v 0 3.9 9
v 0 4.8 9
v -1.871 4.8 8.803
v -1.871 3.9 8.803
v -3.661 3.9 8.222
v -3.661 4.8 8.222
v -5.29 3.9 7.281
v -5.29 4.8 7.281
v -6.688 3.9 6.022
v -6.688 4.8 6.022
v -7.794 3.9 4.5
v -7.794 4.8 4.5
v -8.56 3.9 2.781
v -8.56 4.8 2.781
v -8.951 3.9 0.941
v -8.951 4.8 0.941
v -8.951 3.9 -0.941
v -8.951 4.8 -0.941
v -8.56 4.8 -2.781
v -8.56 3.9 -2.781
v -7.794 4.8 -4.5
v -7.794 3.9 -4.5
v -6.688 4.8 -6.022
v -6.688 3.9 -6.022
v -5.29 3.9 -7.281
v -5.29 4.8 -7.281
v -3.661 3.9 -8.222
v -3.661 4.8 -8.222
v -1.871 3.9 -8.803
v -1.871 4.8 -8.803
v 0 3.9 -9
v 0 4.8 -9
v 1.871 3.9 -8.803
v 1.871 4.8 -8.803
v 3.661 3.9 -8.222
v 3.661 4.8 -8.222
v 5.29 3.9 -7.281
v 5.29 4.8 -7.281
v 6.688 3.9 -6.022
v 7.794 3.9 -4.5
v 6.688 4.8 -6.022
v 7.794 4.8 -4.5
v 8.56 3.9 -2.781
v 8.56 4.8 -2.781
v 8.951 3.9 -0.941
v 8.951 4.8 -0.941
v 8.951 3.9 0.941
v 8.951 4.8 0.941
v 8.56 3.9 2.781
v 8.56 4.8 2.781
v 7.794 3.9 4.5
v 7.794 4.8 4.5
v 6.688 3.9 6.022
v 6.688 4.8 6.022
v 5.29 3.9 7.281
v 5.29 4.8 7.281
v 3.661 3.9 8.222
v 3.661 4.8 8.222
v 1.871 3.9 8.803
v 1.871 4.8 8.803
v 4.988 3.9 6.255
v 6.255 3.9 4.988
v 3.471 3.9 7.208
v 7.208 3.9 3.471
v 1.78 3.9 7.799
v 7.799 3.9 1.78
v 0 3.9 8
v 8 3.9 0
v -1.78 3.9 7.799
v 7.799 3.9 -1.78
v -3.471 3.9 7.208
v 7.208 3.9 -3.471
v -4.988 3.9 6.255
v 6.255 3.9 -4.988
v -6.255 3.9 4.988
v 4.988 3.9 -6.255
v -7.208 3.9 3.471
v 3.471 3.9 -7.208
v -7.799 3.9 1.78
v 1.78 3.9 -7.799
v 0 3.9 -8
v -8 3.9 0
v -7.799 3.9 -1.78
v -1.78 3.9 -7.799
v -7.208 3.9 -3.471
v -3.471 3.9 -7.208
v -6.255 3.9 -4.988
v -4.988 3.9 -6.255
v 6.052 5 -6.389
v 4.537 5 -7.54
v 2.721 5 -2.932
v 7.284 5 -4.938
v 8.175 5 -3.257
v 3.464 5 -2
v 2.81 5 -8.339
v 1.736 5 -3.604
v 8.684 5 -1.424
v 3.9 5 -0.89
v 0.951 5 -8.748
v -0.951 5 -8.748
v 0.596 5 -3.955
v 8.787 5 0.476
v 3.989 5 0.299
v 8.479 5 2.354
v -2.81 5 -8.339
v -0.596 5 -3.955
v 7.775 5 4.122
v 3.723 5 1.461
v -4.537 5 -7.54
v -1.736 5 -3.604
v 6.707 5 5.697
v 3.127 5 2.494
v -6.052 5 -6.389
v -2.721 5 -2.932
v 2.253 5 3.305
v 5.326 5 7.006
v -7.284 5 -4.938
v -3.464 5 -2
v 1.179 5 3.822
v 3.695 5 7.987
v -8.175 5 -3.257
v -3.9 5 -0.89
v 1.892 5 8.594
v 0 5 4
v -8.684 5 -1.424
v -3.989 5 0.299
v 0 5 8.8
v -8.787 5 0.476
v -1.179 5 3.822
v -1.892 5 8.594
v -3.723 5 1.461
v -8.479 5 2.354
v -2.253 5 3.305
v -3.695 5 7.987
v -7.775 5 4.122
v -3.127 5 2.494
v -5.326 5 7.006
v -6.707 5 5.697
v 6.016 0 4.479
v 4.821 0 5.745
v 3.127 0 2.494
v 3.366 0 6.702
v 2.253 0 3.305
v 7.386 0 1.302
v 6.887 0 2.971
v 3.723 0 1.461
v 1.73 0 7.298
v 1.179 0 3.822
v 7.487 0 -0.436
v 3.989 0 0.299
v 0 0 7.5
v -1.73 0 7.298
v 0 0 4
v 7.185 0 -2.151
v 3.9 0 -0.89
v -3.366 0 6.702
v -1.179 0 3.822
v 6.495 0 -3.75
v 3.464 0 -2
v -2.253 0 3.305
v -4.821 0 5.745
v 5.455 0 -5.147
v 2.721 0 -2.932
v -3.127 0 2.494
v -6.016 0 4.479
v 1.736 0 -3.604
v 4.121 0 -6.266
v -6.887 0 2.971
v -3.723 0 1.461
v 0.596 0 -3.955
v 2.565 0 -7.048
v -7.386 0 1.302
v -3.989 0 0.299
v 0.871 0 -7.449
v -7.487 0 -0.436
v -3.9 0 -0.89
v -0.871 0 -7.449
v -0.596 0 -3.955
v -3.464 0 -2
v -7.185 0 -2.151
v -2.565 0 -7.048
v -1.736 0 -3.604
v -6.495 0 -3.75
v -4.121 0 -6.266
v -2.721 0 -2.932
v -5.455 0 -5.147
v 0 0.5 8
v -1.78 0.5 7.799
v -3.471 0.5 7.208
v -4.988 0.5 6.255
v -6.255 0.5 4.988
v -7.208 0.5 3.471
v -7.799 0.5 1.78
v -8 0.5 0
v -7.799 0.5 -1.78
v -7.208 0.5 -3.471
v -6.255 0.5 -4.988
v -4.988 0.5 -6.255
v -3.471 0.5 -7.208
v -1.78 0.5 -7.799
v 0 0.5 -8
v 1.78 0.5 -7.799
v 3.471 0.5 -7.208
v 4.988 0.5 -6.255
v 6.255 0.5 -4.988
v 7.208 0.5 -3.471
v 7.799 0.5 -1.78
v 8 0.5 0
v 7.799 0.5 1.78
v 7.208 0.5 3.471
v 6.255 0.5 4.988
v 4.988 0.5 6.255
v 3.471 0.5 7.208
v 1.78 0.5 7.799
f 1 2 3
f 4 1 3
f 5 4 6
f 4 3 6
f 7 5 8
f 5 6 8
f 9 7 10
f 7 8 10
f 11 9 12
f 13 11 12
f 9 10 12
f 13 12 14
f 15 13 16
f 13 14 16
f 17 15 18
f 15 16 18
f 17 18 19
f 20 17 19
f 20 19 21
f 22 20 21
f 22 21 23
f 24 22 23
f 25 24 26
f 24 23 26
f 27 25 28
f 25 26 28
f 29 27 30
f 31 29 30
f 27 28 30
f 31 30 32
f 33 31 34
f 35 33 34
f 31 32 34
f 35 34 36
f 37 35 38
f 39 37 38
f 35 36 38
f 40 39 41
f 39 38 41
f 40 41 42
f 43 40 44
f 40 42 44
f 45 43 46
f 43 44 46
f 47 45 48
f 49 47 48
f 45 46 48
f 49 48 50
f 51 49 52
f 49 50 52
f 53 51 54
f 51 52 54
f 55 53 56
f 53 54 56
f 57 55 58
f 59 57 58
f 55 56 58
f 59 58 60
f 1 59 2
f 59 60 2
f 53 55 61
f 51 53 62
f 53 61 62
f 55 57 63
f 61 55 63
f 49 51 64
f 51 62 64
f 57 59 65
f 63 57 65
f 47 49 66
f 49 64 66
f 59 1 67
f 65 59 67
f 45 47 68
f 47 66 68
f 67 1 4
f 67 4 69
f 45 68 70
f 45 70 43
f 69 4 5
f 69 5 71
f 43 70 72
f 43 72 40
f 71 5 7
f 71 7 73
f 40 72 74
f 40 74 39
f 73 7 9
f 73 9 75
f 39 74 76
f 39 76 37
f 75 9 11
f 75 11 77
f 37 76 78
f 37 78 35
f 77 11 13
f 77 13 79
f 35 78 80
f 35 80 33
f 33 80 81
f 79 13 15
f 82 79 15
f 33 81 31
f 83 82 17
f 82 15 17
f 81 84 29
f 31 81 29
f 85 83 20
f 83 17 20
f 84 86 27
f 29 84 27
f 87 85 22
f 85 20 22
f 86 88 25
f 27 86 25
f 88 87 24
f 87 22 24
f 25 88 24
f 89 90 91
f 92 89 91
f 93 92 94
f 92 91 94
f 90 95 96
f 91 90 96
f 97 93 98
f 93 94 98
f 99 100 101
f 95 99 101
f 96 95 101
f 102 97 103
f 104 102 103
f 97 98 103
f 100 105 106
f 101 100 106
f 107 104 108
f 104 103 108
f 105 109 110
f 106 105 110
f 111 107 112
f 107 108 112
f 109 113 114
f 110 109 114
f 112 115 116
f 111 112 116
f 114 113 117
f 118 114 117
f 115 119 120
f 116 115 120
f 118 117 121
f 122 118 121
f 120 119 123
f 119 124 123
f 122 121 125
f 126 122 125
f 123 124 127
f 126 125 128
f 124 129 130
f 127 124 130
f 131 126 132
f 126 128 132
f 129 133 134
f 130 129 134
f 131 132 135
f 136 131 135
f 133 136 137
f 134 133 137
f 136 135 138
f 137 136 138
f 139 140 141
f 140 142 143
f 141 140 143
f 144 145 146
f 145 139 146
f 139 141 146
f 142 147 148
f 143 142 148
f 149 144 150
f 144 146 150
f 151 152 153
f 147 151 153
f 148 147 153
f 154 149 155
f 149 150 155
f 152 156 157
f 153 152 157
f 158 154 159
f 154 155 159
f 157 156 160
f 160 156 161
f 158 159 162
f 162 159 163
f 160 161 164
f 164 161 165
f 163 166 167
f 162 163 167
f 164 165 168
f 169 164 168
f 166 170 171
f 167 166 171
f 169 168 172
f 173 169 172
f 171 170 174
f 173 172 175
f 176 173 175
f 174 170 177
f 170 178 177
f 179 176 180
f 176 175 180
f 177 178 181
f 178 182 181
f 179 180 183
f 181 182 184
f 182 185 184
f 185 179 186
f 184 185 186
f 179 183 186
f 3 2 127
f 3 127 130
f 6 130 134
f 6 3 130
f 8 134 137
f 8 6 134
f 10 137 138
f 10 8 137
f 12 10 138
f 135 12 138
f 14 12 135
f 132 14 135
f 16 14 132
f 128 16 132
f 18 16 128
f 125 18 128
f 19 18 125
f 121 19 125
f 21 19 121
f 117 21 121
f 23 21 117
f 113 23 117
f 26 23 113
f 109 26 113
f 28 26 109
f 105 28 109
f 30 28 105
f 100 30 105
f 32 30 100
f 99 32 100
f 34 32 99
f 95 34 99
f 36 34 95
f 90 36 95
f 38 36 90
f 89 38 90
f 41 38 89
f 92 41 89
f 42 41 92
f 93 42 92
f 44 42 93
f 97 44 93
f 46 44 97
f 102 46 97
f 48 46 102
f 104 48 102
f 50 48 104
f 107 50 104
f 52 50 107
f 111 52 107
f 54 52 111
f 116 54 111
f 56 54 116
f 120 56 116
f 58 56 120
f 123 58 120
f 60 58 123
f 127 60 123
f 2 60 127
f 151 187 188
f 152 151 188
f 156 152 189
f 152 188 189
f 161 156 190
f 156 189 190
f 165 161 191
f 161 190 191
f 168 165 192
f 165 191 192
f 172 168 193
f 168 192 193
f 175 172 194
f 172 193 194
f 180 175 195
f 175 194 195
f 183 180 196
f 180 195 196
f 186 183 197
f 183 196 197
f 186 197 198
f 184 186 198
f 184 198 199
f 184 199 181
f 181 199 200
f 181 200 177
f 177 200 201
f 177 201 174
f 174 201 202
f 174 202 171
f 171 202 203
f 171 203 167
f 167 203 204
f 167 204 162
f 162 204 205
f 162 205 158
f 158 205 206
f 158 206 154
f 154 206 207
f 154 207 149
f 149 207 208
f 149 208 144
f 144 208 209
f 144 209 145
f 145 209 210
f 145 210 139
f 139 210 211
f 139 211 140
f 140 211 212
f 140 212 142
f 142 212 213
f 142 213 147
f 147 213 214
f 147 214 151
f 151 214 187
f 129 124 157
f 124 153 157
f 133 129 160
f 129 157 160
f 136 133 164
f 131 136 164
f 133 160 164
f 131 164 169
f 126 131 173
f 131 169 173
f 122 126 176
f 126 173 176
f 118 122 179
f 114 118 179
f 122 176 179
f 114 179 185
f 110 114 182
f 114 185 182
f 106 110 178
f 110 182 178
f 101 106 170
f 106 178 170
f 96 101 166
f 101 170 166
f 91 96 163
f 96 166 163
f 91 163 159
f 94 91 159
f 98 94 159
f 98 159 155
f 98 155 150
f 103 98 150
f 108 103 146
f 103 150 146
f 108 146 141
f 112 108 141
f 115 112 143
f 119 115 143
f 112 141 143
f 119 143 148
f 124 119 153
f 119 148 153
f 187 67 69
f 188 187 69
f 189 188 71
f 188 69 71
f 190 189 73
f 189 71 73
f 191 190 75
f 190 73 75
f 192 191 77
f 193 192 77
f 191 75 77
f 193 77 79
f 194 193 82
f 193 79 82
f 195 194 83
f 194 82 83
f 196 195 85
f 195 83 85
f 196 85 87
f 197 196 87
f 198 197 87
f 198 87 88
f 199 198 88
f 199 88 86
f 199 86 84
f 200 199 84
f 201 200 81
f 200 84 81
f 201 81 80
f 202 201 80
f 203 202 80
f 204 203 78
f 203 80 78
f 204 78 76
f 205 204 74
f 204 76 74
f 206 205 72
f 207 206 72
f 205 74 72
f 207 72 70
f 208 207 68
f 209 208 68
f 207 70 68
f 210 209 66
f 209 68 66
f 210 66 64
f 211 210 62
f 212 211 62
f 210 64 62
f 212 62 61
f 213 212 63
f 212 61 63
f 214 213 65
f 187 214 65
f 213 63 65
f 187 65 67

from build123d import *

# Parameters (mm, degrees)
CHAMFER_1_SIZE = 0.5
CHAMFER_2_SIZE = 0.2


with BuildPart() as part:
    # 草图1 → 旋转1 (revolve)
    with BuildSketch(Plane.XY, mode=Mode.PRIVATE) as revolve_1_sk:
        Polygon((-4, 0), (-8, 0), (-8, 3.9), (-9, 3.9), (-9, 5), (-4, 5), align=None)
    revolve(revolve_1_sk.sketch.rotate(Axis((0, 10.75638676, 0), (0, -1, 0)), 270), axis=Axis((0, 10.75638676, 0), (0, -1, 0)))

    # 倒角1
    chamfer_1_edges = [part.edges().sort_by_distance(p)[0] for p in [
        (0, 0, -8),
    ]]
    chamfer(chamfer_1_edges, length=CHAMFER_1_SIZE)

    # 倒角2
    chamfer_2_edges = [part.edges().sort_by_distance(p)[0] for p in [
        (0, 5, -9),
    ]]
    chamfer(chamfer_2_edges, length=CHAMFER_2_SIZE)


solid = part.part
